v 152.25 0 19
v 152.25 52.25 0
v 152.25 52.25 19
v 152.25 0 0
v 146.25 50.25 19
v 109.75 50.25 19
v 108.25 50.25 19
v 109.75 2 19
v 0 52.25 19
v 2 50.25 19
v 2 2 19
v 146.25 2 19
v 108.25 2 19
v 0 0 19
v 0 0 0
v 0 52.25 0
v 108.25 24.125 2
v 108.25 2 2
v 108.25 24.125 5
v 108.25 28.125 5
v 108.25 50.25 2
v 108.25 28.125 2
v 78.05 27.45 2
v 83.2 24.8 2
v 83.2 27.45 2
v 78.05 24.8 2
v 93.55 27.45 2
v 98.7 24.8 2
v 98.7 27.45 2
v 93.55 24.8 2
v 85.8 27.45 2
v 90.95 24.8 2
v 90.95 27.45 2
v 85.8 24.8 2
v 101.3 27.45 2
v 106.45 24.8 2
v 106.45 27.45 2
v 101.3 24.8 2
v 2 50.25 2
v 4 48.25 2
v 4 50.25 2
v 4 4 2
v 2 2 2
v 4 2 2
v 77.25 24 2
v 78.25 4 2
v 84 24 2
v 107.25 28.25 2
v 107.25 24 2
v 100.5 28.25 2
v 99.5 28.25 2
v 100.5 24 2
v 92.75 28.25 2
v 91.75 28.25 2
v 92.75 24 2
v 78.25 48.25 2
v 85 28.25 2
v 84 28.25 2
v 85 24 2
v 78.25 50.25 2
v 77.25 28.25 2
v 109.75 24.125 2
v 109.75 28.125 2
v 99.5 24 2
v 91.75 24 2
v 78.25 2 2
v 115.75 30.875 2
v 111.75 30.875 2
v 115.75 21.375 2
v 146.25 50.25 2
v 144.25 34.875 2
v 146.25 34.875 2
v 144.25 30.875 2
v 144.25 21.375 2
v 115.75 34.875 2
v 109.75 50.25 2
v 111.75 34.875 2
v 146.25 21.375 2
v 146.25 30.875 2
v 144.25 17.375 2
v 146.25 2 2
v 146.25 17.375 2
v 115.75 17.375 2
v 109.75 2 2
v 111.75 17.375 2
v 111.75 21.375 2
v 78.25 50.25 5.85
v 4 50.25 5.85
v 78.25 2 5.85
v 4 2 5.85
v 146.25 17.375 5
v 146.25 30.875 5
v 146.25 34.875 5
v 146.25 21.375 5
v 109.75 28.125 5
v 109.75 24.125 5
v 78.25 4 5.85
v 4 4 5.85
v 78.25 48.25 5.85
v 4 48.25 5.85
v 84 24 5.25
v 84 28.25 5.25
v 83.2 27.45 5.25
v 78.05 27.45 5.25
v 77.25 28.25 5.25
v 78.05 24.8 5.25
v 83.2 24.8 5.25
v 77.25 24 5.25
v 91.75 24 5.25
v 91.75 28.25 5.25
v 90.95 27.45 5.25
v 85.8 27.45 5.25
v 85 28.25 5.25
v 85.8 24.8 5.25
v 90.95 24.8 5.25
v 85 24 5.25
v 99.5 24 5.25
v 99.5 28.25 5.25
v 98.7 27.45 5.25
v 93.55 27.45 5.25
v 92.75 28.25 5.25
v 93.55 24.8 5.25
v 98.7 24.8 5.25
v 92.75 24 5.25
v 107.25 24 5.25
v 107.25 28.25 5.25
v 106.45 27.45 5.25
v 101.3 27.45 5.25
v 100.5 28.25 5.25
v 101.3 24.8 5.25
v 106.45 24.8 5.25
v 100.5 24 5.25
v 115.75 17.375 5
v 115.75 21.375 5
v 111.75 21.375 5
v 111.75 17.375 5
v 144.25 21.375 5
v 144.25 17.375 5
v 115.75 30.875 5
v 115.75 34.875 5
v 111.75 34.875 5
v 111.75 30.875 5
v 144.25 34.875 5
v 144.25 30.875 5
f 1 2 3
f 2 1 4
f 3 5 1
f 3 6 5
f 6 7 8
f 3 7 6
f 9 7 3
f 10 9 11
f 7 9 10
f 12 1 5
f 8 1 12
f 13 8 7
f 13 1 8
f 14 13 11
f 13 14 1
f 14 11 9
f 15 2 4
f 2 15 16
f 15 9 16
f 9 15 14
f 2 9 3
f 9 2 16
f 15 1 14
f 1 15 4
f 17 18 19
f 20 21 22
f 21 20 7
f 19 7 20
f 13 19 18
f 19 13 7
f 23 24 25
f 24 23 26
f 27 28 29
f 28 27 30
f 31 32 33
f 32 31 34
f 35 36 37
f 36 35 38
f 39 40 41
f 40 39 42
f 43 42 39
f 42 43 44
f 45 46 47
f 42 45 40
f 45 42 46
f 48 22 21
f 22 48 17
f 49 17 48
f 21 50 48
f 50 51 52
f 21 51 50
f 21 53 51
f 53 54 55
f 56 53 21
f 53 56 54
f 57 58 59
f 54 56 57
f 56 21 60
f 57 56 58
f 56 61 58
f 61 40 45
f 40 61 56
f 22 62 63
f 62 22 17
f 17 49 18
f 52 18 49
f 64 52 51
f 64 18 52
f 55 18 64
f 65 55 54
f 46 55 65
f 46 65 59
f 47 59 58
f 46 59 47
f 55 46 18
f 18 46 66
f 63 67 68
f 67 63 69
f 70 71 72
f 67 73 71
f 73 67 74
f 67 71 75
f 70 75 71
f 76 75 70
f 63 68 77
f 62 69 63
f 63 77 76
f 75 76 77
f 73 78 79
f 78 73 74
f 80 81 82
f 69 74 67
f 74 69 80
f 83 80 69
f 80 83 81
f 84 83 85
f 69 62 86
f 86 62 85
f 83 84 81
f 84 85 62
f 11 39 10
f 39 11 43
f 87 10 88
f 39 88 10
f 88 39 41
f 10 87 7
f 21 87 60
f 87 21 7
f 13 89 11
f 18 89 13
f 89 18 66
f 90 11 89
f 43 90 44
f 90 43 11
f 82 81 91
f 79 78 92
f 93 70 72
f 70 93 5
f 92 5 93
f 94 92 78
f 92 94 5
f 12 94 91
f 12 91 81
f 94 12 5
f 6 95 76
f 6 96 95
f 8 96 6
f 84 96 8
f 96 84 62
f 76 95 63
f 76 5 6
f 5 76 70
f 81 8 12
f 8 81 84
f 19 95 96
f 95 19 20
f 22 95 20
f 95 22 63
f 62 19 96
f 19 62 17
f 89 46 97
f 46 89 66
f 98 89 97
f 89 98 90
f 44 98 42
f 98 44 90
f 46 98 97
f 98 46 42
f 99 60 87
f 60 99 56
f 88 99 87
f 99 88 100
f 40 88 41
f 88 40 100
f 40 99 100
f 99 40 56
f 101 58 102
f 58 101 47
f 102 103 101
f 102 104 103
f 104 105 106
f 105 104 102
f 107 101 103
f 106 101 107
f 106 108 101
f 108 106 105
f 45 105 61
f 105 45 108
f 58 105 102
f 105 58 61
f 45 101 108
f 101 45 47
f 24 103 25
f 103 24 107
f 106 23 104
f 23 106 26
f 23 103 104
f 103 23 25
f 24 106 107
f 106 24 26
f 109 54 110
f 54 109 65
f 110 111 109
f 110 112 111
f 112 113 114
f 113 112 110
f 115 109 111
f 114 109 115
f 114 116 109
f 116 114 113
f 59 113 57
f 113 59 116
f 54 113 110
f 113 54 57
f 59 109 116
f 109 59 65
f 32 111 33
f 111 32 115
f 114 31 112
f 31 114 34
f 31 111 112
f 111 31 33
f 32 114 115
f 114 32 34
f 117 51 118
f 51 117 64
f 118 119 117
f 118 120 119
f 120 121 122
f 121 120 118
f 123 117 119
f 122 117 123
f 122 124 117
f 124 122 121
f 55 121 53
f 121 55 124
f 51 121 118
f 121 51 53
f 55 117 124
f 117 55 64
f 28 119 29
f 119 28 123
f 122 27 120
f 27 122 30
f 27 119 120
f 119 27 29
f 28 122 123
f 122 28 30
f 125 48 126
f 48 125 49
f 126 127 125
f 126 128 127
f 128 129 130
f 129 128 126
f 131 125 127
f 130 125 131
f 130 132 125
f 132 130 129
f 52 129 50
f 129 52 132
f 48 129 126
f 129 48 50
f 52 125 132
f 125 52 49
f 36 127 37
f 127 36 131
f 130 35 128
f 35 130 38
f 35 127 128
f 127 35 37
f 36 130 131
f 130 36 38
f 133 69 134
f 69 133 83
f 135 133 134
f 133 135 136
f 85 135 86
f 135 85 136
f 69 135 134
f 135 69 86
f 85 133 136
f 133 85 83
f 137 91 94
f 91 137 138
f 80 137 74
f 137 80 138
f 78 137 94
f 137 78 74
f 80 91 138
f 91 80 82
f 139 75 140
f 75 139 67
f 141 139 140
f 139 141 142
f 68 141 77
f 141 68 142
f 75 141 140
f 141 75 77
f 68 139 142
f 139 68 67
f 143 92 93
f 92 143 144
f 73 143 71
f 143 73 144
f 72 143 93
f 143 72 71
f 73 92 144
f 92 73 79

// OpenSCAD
// ============================================================
// Part 3 — Rolling Door Remote + Boost Converter Enclosure
// ============================================================
// Single base shell, three zones along X:
//   Chamber A — card-edge slide rails for the decased key-fob PCB, plus a
//               tray of 4x EL817C friction frames (wired across the fob's
//               UP/DOWN/STOP/LOCK button pads)
//   Divider   — 1.5mm solid wall, isolates the RF trace antenna in Chamber A
//               from the boost converter's switching-inductor noise
//   Chamber B — standoff posts for the MT3608 boost module
//
// Render:   openscad -o part3_remote_boost_enclosure.3mf part3_remote_boost_enclosure.scad
//
// The fob PCB has NO public dimension anywhere (generic OEM board, sold under
// many brand names) — Chamber A uses adjustable slide rails rather than a
// snug pocket so it isn't hostage to a guessed number. The MT3608 has two
// common variants 8mm apart in height; mt3608_use_tall_variant picks which
// one this run is built for.

$fn = 48;

tol = 0.25;

// ---- decased 4-button RF key fob PCB ----
// VERIFY ON ARRIVAL — no manufacturer spec exists for this part; these are
// rough placeholders sized for a typical small remote. Chamber A is designed
// as adjustable rails (see rail_gap below) specifically so this guess matters less.
fob_pcb_w = 40;
fob_pcb_h = 70;
fob_pcb_t = 1.6;
rail_gap  = 4;              // extra width margin the rails allow beyond fob_pcb_w — widen if real board is bigger

// ---- MT3608 boost converter module ----
// Two variants seen in the field, 8mm apart in height. Pick one; re-run the
// script if the wrong variant shows up.
mt3608_use_tall_variant = true;   // true = 36x17x14mm (trimpot module), false = 30x17x6mm (slim USB-input module)
mt3608_l = mt3608_use_tall_variant ? 36 : 30;
mt3608_w = 17;
mt3608_h = mt3608_use_tall_variant ? 14 : 6;

// ---- EL817C DIP-4 (standard JEDEC package — confirmed low-risk) ----
el817_l = 6.5;
el817_w = 4.0;
el817_h = 3.0;
el817_count = 4;             // UP / DOWN / STOP / LOCK

wall      = 2;
divider   = 1.5;             // RF / thermal isolation wall, per brief
bay_gap   = 1;
frame_wt  = 0.8;

// ---- Chamber A: fob rails ----
rail_w    = 2;                                  // width of each guide rail
rail_gap_total = fob_pcb_w + tol + rail_gap;     // channel width the rails define
chA_slot_l = fob_pcb_h + tol + 4;                // room to slide the board in lengthwise
chA_w      = rail_gap_total + 2*rail_w;

// ---- optocoupler tray (4x EL817C, in a row, same chamber as the fob) ----
// each frame's footprint is el817_l (X) by el817_w (Y); laid out in a row along X
opto_tray_l = el817_count * (el817_l + tol + bay_gap) + bay_gap;
opto_tray_w = el817_w + tol + 2*bay_gap;

chA_total_l = chA_slot_l + opto_tray_l;

// ---- Chamber B: MT3608 mount ----
post_w = 4;
chB_l  = mt3608_l + 2*tol + 2*wall;
chB_w  = mt3608_w + 2*tol + 2*wall;

shell_l = wall + chA_total_l + divider + chB_l + wall;
shell_w = max(chA_w, chB_w) + 2*wall;
cavity_h = max(fob_pcb_t + 6, mt3608_h + 1) + wall;   // tallest internal requirement plus floor

// ============================================================
module component_frame(l, w, h, wt = frame_wt) {
    difference() {
        cube([l, w, h]);
        translate([wt, wt, -1]) cube([l - 2*wt, w - 2*wt, h + 2]);
    }
}

module fob_rails(x0, y0) {
    // two facing L-rails the fob PCB's long edges slide into, like a card-edge guide
    translate([x0, y0, wall])
        cube([chA_slot_l, rail_w, fob_pcb_t + tol + 2]);
    translate([x0, y0 + rail_w + rail_gap_total, wall])
        cube([chA_slot_l, rail_w, fob_pcb_t + tol + 2]);
}

module opto_tray(x0, y0) {
    for (i = [0 : el817_count - 1])
        translate([x0 + bay_gap + i * (el817_l + tol + bay_gap), y0, wall])
            component_frame(el817_l + tol, el817_w + tol, el817_h + tol);
}

module base_shell() {
    difference() {
        cube([shell_l, shell_w, cavity_h + wall]);

        // Chamber A open cavity (rails + optocoupler tray both live in this open pocket)
        translate([wall, wall, wall])
            cube([chA_total_l, shell_w - 2*wall, cavity_h + 1]);

        // Chamber B open cavity
        translate([wall + chA_total_l + divider, wall, wall])
            cube([chB_l - 2*wall, shell_w - 2*wall, cavity_h + 1]);

        // wire pass-through low in the divider (button leads -> optocouplers already
        // inside chamber A; this notch is for the 12V feed from Chamber B to the fob pads)
        translate([wall + chA_total_l, wall + (shell_w - 2*wall)/2 - 2, wall])
            cube([divider, 4, 3]);
    }

    // fob card-edge rails, centered in chamber A's first section
    fob_rails(wall + 2, wall + (shell_w - 2*wall - rail_gap_total)/2 - rail_w);

    // optocoupler tray, right after the fob slot
    opto_tray(wall + chA_slot_l, wall + (shell_w - 2*wall - opto_tray_w)/2 + bay_gap);

    // MT3608 standoff posts (4 corners), height sized to the selected variant's
    // clearance — module rests on top, secured by its own mounting holes / zip tie
    for (pos = [[0,0], [mt3608_l + 2*tol - post_w, 0],
                [0, mt3608_w + 2*tol - post_w], [mt3608_l + 2*tol - post_w, mt3608_w + 2*tol - post_w]])
        translate([wall + chA_total_l + divider + wall + pos[0],
                    wall + (shell_w - 2*wall - (mt3608_w + 2*tol))/2 + pos[1],
                    wall])
            cube([post_w, post_w, 3]);
}

base_shell();
